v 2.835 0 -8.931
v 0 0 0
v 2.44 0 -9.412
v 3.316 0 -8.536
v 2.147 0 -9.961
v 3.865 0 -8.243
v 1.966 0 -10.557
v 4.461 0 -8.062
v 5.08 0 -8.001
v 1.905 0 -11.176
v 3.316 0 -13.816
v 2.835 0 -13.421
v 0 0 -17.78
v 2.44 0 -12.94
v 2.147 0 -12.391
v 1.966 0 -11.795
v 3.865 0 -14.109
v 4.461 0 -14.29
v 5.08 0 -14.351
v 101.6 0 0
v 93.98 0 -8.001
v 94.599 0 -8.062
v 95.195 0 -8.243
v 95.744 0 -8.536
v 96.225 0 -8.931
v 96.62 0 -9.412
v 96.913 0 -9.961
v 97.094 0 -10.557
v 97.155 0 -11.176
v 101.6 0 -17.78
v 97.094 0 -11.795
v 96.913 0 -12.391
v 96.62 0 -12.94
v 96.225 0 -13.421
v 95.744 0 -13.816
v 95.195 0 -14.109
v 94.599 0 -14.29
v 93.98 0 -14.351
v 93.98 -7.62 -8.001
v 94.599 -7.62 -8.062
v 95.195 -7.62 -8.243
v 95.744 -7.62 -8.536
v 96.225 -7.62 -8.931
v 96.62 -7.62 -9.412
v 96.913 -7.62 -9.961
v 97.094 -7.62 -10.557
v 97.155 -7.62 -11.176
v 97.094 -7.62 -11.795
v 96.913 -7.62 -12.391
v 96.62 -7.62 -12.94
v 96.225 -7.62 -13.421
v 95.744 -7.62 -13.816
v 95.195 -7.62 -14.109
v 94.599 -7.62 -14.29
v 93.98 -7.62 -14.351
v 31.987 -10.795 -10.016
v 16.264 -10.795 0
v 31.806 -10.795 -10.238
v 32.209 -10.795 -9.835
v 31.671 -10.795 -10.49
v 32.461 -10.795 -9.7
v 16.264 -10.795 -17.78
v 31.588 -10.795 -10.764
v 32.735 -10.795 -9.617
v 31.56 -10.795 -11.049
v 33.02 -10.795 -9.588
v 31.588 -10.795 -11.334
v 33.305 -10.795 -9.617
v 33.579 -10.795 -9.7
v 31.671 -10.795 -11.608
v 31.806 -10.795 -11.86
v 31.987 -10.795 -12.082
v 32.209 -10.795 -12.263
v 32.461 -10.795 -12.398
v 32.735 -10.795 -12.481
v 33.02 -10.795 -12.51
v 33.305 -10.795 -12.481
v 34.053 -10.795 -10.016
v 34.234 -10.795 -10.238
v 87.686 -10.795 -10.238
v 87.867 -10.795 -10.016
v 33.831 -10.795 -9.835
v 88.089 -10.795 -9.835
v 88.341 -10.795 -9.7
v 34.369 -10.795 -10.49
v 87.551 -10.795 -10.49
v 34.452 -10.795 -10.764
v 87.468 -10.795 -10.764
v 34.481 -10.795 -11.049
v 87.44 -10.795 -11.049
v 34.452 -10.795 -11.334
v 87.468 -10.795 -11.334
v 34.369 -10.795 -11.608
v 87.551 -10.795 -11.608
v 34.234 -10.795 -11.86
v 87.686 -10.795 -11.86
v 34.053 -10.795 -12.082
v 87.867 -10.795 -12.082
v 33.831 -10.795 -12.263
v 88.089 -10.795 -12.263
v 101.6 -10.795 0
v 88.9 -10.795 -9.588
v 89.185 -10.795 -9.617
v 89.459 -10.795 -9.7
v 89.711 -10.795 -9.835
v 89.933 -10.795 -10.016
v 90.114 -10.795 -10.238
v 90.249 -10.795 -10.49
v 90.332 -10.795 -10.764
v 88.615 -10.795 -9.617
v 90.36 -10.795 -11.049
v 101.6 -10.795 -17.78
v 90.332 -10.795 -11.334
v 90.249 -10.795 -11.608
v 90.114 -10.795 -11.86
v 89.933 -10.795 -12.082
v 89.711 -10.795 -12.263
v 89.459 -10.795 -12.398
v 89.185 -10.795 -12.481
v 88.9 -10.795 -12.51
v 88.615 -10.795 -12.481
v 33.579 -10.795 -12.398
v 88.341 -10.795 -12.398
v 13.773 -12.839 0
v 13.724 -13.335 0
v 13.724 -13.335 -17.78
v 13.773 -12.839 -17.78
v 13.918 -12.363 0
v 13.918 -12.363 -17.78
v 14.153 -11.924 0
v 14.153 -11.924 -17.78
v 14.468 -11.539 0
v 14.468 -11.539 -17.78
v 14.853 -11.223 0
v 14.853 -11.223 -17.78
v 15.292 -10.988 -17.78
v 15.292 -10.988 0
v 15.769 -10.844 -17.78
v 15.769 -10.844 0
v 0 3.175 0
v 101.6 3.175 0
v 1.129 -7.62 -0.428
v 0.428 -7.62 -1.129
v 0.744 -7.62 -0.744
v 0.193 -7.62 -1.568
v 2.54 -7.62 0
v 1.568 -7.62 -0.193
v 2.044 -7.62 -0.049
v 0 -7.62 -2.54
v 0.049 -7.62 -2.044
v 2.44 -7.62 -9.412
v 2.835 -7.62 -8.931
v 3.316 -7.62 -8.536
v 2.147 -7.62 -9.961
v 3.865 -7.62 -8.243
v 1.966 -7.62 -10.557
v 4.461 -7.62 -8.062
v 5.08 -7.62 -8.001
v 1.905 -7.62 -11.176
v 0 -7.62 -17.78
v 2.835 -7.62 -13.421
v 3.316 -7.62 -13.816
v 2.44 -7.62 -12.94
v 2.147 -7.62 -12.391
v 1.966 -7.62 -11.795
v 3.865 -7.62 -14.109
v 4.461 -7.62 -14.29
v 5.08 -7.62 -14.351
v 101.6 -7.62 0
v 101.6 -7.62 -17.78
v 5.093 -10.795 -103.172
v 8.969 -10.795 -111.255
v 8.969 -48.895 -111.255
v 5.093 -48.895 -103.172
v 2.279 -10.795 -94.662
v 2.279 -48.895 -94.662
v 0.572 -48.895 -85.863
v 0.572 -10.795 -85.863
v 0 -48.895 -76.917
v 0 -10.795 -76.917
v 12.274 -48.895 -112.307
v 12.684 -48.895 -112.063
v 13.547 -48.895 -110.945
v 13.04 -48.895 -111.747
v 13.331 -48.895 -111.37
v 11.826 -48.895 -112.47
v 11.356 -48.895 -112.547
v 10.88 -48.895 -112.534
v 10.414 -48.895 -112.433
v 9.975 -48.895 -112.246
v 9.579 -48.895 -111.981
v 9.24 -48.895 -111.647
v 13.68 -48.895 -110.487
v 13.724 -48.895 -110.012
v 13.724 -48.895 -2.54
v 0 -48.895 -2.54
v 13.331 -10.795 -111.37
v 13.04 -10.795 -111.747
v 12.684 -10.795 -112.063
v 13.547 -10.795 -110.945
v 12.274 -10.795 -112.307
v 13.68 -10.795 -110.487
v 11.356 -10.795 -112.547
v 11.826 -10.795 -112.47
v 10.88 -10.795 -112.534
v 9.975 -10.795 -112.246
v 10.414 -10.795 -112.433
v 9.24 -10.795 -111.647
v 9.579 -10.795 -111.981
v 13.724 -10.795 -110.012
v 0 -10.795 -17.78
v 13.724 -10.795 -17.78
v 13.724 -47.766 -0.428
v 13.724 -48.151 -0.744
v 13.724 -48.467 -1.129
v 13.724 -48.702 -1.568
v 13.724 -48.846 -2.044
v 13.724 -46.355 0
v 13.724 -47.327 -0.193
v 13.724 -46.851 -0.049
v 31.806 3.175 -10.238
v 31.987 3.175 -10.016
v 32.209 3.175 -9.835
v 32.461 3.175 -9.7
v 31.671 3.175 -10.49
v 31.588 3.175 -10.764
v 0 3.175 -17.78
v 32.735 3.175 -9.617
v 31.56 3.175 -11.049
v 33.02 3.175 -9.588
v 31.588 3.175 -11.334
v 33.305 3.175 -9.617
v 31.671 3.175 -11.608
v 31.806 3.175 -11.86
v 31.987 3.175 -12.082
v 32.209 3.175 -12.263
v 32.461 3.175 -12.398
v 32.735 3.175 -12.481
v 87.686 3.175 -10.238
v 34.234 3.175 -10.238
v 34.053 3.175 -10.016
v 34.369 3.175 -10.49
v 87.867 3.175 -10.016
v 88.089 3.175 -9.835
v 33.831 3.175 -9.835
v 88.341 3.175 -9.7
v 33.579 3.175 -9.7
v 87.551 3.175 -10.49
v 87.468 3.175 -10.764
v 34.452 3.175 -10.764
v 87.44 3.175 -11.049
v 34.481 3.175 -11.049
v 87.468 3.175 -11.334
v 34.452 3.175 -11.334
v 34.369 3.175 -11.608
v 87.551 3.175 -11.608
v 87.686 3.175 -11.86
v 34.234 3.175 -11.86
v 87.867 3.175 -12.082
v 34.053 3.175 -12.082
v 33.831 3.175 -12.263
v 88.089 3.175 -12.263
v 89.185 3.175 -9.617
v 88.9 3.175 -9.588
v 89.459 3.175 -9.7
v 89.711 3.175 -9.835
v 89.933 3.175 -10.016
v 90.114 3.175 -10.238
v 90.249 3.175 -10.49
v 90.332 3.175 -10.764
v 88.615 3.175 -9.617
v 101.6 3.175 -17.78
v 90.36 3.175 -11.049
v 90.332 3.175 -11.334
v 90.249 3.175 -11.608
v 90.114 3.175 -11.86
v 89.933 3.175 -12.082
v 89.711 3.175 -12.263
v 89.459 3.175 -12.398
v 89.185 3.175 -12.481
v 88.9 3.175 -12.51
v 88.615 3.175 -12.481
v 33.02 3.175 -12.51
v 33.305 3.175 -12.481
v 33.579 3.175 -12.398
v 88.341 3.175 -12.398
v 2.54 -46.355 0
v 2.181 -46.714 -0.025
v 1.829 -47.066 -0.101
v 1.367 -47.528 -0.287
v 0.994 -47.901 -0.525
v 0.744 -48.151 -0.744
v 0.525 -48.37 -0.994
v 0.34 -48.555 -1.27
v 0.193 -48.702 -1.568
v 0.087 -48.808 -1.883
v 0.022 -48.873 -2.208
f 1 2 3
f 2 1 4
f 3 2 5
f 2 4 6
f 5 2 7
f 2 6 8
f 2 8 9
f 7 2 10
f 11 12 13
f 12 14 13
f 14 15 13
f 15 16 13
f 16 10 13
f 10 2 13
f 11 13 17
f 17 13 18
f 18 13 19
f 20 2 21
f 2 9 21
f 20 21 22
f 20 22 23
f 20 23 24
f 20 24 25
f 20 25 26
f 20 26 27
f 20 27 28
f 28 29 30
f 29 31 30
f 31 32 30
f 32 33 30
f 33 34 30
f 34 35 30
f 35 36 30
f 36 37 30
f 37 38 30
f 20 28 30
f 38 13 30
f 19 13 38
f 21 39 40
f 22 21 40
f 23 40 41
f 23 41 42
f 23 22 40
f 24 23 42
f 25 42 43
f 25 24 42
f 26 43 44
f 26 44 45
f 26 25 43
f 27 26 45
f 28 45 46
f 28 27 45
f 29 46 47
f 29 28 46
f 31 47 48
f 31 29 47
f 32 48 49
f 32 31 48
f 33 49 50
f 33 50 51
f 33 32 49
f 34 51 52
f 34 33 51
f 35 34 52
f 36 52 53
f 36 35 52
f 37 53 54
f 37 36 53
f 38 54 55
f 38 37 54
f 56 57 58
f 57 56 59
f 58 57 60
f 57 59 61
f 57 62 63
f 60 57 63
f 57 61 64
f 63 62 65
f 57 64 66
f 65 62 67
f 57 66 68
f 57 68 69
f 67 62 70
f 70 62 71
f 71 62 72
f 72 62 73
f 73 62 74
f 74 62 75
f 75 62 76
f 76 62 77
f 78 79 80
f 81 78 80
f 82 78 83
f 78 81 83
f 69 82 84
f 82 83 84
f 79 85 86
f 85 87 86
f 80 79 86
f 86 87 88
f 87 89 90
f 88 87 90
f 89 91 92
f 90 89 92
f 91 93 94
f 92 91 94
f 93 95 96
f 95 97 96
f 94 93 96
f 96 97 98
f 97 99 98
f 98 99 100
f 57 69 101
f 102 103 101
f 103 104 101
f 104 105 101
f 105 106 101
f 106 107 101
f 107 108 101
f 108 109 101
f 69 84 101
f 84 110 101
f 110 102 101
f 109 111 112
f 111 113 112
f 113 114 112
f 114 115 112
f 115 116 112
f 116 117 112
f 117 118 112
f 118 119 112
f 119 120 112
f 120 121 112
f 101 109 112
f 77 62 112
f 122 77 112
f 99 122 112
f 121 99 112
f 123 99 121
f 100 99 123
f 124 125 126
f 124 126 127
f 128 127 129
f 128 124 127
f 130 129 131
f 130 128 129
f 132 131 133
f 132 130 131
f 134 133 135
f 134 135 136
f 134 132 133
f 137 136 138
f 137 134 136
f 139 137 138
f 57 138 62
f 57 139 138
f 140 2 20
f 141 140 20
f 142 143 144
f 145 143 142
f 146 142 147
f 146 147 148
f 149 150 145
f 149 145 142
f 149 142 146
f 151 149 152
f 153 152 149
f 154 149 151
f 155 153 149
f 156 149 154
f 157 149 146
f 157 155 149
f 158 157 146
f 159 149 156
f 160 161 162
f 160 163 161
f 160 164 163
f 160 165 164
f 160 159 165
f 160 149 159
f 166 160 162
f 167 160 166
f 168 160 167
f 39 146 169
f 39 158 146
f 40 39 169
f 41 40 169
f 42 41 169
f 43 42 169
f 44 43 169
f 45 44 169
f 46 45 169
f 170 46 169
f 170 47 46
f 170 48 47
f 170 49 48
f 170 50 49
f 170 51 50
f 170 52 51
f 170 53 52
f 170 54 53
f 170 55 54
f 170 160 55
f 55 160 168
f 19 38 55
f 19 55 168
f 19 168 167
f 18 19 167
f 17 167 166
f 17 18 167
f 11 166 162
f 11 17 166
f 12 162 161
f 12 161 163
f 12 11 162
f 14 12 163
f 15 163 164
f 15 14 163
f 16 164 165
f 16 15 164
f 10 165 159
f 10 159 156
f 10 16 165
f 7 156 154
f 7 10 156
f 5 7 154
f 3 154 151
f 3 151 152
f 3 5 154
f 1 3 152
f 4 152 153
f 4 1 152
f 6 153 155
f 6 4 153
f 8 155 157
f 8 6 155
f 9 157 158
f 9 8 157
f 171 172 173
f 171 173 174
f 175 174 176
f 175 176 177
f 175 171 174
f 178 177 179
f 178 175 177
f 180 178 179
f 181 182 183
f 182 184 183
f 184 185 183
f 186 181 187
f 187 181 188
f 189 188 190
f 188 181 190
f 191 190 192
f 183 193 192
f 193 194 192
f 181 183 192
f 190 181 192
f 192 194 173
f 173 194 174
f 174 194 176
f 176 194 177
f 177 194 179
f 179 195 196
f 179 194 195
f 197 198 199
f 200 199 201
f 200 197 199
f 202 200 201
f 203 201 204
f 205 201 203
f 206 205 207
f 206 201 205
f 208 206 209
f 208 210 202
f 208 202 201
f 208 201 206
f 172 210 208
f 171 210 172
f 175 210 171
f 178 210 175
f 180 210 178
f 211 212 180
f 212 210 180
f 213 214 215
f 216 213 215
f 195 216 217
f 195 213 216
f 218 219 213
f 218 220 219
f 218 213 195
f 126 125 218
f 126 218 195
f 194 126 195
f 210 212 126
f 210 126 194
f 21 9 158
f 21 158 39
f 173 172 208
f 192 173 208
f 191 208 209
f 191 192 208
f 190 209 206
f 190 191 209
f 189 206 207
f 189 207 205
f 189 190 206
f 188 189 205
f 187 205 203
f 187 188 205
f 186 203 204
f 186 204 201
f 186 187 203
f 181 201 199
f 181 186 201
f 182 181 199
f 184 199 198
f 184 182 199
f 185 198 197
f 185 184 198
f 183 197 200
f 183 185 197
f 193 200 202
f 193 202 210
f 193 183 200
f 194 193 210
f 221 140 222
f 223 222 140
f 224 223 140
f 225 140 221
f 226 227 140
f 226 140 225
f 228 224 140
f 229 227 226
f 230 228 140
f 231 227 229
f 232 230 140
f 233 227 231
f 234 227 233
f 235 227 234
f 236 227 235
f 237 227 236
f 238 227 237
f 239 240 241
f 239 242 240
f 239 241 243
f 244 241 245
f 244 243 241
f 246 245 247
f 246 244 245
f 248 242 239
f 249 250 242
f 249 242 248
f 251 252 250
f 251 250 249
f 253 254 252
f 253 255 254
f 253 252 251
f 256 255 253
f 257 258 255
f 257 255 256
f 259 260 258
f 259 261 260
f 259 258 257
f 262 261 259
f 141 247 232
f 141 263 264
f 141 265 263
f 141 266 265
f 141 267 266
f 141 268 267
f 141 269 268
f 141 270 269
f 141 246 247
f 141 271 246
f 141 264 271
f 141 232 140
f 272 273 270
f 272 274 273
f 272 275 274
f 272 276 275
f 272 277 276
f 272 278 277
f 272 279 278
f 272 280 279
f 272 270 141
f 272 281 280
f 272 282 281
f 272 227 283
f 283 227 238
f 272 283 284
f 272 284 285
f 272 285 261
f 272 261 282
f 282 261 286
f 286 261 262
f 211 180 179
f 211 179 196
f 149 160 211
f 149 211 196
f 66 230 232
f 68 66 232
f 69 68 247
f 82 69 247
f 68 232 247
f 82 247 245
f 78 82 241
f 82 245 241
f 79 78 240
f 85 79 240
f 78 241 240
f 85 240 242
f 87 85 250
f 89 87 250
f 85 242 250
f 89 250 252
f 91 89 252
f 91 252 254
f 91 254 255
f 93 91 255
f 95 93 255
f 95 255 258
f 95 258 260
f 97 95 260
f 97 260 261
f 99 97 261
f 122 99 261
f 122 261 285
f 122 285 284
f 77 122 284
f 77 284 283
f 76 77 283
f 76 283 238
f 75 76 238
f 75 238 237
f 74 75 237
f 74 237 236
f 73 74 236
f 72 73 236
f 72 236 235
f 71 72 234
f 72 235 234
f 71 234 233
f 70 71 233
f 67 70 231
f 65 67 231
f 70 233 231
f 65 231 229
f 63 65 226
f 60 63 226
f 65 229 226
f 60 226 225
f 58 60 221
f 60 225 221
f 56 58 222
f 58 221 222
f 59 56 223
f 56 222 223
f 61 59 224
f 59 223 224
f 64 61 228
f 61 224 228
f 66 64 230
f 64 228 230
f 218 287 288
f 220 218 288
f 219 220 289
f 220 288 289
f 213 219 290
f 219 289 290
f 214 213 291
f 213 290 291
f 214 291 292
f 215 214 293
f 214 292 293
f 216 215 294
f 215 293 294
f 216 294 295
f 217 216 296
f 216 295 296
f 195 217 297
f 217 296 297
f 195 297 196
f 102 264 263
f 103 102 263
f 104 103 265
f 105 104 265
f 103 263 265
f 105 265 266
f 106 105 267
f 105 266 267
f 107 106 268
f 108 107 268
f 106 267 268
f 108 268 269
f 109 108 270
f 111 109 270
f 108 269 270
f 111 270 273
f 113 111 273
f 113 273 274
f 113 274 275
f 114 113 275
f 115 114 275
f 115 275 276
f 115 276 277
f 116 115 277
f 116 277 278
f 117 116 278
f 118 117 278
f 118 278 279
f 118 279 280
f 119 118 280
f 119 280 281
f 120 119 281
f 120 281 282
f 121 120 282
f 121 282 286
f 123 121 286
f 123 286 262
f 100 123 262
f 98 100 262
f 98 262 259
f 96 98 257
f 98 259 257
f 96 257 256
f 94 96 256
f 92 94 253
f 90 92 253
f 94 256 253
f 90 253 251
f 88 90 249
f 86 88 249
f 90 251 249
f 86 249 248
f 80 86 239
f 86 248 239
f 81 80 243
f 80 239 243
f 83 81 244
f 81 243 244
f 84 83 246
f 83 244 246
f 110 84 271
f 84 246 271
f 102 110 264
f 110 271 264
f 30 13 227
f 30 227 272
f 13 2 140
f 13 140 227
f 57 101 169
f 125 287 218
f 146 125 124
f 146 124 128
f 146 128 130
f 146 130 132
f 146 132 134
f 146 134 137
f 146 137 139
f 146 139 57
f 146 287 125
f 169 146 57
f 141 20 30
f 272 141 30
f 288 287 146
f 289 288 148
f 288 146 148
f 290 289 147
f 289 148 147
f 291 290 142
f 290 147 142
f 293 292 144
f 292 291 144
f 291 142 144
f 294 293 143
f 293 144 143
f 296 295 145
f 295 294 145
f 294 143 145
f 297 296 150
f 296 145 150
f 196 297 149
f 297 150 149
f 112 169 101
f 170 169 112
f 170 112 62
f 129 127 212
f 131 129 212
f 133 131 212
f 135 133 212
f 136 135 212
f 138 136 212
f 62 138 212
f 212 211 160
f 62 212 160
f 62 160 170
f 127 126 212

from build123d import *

# Parameters (mm, degrees)
SKETCH2_W           = 101.6
SKETCH2_H           = 17.78
BOSS_EXTRUDE1_DEPTH = 3.175
BOSS_EXTRUDE2_DEPTH = 7.62
BOSS_EXTRUDE3_DEPTH = 38.1
FILLET2_R           = 2.54
FILLET3_R           = 2.54
SKETCH6_R           = 1.4605
CUT_EXTRUDE1_DEPTH  = 161.318129994


with BuildPart() as part:
    # Sketch2 → Boss-Extrude1 (new body)
    with BuildSketch(Plane(origin=(0, 0, 0), x_dir=(1, 0, 0), z_dir=(0, 1, 0))):
        with Locations((50.8, 8.89)):
            Rectangle(SKETCH2_W, SKETCH2_H)
    boss_extrude1 = extrude(amount=BOSS_EXTRUDE1_DEPTH)

    # Sketch3 → Boss-Extrude2 (add)
    with BuildSketch(Plane.XZ):
        with BuildLine():
            Line((93.98, -14.351), (5.08, -14.351))
            ThreePointArc((5.08, -14.351), (1.905, -11.176), (5.08, -8.001))
            Line((5.08, -8.001), (93.98, -8.001))
            ThreePointArc((93.98, -8.001), (97.155, -11.176), (93.98, -14.351))
        make_face()
    extrude(amount=BOSS_EXTRUDE2_DEPTH)

    # Mirror1: Boss-Extrude1 across plane
    add(boss_extrude1.mirror(Plane(origin=(0, -3.81, 0), x_dir=(0, 0, 1), z_dir=(0, -1, 0))))

    # Sketch5 → Boss-Extrude3 (add)
    with BuildSketch(Plane.XZ.offset(10.795)):
        with BuildLine():
            Line((0, 0), (13.724447784, 0))
            Line((13.724447784, 0), (13.724447784, -118.618))
            ThreePointArc((13.724447784, -118.618), (3.519309988, -98.867872234), (0, -76.917317766))
            Line((0, -76.917317766), (0, 0))
        make_face()
    extrude(amount=BOSS_EXTRUDE3_DEPTH)

    # Fillet2
    fillet2_edges = [part.edges().sort_by_distance(p)[0] for p in [
        (13.724447784, -29.845, -118.618),
    ]]
    fillet(fillet2_edges, radius=FILLET2_R)

    # Fillet3
    # the kernel refuses this fillet: 2.54 mm, written as the material it adds along each edge
    with BuildSketch(Plane(origin=(13.724447784, -10.795, 0), x_dir=(0, -1, 0), z_dir=(0, 0, -1))) as fillet3_piece_1:
        with BuildLine():
            CenterArc((FILLET3_R, -FILLET3_R), FILLET3_R, 90, 90)
            Line((0, -FILLET3_R), (0, 0))
            Line((0, 0), (FILLET3_R, 0))
        make_face()
    extrude(amount=17.78)
    # the kernel refuses this fillet: 2.54 mm, written as the material it takes off along each edge
    with BuildSketch(Plane(origin=(0, -1.27, 0), x_dir=(0, 0, -1), z_dir=(0, -1, 0))) as fillet3_2_piece_1:
        with BuildLine():
            CenterArc((FILLET3_R, FILLET3_R), FILLET3_R, 180, 90)
            Line((0, FILLET3_R), (0, 0))
            Line((0, 0), (FILLET3_R, 0))
        make_face()
    extrude(amount=53.975, mode=Mode.SUBTRACT)
    with BuildSketch(Plane(origin=(-6.35, -48.895, 0), x_dir=(0, 0, -1), z_dir=(1, 0, 0))) as fillet3_2_piece_2:
        with BuildLine():
            CenterArc((FILLET3_R, FILLET3_R), FILLET3_R, 180, 90)
            Line((0, FILLET3_R), (0, 0))
            Line((0, 0), (FILLET3_R, 0))
        make_face()
    extrude(amount=26.424447784, mode=Mode.SUBTRACT)

    # Sketch6 → Cut-Extrude1 (cut, through all)
    with BuildSketch(Plane(origin=(0, 3.175, 0), x_dir=(1, 0, 0), z_dir=(0, 1, 0))):
        with Locations(Location((88.9, 11.049, 0), (0, 0, 270))):
            Circle(SKETCH6_R)
        with Locations(Location((33.02, 11.049, 0), (0, 0, 270))):
            Circle(SKETCH6_R)
    extrude(amount=-CUT_EXTRUDE1_DEPTH, mode=Mode.SUBTRACT)


solid = part.part
